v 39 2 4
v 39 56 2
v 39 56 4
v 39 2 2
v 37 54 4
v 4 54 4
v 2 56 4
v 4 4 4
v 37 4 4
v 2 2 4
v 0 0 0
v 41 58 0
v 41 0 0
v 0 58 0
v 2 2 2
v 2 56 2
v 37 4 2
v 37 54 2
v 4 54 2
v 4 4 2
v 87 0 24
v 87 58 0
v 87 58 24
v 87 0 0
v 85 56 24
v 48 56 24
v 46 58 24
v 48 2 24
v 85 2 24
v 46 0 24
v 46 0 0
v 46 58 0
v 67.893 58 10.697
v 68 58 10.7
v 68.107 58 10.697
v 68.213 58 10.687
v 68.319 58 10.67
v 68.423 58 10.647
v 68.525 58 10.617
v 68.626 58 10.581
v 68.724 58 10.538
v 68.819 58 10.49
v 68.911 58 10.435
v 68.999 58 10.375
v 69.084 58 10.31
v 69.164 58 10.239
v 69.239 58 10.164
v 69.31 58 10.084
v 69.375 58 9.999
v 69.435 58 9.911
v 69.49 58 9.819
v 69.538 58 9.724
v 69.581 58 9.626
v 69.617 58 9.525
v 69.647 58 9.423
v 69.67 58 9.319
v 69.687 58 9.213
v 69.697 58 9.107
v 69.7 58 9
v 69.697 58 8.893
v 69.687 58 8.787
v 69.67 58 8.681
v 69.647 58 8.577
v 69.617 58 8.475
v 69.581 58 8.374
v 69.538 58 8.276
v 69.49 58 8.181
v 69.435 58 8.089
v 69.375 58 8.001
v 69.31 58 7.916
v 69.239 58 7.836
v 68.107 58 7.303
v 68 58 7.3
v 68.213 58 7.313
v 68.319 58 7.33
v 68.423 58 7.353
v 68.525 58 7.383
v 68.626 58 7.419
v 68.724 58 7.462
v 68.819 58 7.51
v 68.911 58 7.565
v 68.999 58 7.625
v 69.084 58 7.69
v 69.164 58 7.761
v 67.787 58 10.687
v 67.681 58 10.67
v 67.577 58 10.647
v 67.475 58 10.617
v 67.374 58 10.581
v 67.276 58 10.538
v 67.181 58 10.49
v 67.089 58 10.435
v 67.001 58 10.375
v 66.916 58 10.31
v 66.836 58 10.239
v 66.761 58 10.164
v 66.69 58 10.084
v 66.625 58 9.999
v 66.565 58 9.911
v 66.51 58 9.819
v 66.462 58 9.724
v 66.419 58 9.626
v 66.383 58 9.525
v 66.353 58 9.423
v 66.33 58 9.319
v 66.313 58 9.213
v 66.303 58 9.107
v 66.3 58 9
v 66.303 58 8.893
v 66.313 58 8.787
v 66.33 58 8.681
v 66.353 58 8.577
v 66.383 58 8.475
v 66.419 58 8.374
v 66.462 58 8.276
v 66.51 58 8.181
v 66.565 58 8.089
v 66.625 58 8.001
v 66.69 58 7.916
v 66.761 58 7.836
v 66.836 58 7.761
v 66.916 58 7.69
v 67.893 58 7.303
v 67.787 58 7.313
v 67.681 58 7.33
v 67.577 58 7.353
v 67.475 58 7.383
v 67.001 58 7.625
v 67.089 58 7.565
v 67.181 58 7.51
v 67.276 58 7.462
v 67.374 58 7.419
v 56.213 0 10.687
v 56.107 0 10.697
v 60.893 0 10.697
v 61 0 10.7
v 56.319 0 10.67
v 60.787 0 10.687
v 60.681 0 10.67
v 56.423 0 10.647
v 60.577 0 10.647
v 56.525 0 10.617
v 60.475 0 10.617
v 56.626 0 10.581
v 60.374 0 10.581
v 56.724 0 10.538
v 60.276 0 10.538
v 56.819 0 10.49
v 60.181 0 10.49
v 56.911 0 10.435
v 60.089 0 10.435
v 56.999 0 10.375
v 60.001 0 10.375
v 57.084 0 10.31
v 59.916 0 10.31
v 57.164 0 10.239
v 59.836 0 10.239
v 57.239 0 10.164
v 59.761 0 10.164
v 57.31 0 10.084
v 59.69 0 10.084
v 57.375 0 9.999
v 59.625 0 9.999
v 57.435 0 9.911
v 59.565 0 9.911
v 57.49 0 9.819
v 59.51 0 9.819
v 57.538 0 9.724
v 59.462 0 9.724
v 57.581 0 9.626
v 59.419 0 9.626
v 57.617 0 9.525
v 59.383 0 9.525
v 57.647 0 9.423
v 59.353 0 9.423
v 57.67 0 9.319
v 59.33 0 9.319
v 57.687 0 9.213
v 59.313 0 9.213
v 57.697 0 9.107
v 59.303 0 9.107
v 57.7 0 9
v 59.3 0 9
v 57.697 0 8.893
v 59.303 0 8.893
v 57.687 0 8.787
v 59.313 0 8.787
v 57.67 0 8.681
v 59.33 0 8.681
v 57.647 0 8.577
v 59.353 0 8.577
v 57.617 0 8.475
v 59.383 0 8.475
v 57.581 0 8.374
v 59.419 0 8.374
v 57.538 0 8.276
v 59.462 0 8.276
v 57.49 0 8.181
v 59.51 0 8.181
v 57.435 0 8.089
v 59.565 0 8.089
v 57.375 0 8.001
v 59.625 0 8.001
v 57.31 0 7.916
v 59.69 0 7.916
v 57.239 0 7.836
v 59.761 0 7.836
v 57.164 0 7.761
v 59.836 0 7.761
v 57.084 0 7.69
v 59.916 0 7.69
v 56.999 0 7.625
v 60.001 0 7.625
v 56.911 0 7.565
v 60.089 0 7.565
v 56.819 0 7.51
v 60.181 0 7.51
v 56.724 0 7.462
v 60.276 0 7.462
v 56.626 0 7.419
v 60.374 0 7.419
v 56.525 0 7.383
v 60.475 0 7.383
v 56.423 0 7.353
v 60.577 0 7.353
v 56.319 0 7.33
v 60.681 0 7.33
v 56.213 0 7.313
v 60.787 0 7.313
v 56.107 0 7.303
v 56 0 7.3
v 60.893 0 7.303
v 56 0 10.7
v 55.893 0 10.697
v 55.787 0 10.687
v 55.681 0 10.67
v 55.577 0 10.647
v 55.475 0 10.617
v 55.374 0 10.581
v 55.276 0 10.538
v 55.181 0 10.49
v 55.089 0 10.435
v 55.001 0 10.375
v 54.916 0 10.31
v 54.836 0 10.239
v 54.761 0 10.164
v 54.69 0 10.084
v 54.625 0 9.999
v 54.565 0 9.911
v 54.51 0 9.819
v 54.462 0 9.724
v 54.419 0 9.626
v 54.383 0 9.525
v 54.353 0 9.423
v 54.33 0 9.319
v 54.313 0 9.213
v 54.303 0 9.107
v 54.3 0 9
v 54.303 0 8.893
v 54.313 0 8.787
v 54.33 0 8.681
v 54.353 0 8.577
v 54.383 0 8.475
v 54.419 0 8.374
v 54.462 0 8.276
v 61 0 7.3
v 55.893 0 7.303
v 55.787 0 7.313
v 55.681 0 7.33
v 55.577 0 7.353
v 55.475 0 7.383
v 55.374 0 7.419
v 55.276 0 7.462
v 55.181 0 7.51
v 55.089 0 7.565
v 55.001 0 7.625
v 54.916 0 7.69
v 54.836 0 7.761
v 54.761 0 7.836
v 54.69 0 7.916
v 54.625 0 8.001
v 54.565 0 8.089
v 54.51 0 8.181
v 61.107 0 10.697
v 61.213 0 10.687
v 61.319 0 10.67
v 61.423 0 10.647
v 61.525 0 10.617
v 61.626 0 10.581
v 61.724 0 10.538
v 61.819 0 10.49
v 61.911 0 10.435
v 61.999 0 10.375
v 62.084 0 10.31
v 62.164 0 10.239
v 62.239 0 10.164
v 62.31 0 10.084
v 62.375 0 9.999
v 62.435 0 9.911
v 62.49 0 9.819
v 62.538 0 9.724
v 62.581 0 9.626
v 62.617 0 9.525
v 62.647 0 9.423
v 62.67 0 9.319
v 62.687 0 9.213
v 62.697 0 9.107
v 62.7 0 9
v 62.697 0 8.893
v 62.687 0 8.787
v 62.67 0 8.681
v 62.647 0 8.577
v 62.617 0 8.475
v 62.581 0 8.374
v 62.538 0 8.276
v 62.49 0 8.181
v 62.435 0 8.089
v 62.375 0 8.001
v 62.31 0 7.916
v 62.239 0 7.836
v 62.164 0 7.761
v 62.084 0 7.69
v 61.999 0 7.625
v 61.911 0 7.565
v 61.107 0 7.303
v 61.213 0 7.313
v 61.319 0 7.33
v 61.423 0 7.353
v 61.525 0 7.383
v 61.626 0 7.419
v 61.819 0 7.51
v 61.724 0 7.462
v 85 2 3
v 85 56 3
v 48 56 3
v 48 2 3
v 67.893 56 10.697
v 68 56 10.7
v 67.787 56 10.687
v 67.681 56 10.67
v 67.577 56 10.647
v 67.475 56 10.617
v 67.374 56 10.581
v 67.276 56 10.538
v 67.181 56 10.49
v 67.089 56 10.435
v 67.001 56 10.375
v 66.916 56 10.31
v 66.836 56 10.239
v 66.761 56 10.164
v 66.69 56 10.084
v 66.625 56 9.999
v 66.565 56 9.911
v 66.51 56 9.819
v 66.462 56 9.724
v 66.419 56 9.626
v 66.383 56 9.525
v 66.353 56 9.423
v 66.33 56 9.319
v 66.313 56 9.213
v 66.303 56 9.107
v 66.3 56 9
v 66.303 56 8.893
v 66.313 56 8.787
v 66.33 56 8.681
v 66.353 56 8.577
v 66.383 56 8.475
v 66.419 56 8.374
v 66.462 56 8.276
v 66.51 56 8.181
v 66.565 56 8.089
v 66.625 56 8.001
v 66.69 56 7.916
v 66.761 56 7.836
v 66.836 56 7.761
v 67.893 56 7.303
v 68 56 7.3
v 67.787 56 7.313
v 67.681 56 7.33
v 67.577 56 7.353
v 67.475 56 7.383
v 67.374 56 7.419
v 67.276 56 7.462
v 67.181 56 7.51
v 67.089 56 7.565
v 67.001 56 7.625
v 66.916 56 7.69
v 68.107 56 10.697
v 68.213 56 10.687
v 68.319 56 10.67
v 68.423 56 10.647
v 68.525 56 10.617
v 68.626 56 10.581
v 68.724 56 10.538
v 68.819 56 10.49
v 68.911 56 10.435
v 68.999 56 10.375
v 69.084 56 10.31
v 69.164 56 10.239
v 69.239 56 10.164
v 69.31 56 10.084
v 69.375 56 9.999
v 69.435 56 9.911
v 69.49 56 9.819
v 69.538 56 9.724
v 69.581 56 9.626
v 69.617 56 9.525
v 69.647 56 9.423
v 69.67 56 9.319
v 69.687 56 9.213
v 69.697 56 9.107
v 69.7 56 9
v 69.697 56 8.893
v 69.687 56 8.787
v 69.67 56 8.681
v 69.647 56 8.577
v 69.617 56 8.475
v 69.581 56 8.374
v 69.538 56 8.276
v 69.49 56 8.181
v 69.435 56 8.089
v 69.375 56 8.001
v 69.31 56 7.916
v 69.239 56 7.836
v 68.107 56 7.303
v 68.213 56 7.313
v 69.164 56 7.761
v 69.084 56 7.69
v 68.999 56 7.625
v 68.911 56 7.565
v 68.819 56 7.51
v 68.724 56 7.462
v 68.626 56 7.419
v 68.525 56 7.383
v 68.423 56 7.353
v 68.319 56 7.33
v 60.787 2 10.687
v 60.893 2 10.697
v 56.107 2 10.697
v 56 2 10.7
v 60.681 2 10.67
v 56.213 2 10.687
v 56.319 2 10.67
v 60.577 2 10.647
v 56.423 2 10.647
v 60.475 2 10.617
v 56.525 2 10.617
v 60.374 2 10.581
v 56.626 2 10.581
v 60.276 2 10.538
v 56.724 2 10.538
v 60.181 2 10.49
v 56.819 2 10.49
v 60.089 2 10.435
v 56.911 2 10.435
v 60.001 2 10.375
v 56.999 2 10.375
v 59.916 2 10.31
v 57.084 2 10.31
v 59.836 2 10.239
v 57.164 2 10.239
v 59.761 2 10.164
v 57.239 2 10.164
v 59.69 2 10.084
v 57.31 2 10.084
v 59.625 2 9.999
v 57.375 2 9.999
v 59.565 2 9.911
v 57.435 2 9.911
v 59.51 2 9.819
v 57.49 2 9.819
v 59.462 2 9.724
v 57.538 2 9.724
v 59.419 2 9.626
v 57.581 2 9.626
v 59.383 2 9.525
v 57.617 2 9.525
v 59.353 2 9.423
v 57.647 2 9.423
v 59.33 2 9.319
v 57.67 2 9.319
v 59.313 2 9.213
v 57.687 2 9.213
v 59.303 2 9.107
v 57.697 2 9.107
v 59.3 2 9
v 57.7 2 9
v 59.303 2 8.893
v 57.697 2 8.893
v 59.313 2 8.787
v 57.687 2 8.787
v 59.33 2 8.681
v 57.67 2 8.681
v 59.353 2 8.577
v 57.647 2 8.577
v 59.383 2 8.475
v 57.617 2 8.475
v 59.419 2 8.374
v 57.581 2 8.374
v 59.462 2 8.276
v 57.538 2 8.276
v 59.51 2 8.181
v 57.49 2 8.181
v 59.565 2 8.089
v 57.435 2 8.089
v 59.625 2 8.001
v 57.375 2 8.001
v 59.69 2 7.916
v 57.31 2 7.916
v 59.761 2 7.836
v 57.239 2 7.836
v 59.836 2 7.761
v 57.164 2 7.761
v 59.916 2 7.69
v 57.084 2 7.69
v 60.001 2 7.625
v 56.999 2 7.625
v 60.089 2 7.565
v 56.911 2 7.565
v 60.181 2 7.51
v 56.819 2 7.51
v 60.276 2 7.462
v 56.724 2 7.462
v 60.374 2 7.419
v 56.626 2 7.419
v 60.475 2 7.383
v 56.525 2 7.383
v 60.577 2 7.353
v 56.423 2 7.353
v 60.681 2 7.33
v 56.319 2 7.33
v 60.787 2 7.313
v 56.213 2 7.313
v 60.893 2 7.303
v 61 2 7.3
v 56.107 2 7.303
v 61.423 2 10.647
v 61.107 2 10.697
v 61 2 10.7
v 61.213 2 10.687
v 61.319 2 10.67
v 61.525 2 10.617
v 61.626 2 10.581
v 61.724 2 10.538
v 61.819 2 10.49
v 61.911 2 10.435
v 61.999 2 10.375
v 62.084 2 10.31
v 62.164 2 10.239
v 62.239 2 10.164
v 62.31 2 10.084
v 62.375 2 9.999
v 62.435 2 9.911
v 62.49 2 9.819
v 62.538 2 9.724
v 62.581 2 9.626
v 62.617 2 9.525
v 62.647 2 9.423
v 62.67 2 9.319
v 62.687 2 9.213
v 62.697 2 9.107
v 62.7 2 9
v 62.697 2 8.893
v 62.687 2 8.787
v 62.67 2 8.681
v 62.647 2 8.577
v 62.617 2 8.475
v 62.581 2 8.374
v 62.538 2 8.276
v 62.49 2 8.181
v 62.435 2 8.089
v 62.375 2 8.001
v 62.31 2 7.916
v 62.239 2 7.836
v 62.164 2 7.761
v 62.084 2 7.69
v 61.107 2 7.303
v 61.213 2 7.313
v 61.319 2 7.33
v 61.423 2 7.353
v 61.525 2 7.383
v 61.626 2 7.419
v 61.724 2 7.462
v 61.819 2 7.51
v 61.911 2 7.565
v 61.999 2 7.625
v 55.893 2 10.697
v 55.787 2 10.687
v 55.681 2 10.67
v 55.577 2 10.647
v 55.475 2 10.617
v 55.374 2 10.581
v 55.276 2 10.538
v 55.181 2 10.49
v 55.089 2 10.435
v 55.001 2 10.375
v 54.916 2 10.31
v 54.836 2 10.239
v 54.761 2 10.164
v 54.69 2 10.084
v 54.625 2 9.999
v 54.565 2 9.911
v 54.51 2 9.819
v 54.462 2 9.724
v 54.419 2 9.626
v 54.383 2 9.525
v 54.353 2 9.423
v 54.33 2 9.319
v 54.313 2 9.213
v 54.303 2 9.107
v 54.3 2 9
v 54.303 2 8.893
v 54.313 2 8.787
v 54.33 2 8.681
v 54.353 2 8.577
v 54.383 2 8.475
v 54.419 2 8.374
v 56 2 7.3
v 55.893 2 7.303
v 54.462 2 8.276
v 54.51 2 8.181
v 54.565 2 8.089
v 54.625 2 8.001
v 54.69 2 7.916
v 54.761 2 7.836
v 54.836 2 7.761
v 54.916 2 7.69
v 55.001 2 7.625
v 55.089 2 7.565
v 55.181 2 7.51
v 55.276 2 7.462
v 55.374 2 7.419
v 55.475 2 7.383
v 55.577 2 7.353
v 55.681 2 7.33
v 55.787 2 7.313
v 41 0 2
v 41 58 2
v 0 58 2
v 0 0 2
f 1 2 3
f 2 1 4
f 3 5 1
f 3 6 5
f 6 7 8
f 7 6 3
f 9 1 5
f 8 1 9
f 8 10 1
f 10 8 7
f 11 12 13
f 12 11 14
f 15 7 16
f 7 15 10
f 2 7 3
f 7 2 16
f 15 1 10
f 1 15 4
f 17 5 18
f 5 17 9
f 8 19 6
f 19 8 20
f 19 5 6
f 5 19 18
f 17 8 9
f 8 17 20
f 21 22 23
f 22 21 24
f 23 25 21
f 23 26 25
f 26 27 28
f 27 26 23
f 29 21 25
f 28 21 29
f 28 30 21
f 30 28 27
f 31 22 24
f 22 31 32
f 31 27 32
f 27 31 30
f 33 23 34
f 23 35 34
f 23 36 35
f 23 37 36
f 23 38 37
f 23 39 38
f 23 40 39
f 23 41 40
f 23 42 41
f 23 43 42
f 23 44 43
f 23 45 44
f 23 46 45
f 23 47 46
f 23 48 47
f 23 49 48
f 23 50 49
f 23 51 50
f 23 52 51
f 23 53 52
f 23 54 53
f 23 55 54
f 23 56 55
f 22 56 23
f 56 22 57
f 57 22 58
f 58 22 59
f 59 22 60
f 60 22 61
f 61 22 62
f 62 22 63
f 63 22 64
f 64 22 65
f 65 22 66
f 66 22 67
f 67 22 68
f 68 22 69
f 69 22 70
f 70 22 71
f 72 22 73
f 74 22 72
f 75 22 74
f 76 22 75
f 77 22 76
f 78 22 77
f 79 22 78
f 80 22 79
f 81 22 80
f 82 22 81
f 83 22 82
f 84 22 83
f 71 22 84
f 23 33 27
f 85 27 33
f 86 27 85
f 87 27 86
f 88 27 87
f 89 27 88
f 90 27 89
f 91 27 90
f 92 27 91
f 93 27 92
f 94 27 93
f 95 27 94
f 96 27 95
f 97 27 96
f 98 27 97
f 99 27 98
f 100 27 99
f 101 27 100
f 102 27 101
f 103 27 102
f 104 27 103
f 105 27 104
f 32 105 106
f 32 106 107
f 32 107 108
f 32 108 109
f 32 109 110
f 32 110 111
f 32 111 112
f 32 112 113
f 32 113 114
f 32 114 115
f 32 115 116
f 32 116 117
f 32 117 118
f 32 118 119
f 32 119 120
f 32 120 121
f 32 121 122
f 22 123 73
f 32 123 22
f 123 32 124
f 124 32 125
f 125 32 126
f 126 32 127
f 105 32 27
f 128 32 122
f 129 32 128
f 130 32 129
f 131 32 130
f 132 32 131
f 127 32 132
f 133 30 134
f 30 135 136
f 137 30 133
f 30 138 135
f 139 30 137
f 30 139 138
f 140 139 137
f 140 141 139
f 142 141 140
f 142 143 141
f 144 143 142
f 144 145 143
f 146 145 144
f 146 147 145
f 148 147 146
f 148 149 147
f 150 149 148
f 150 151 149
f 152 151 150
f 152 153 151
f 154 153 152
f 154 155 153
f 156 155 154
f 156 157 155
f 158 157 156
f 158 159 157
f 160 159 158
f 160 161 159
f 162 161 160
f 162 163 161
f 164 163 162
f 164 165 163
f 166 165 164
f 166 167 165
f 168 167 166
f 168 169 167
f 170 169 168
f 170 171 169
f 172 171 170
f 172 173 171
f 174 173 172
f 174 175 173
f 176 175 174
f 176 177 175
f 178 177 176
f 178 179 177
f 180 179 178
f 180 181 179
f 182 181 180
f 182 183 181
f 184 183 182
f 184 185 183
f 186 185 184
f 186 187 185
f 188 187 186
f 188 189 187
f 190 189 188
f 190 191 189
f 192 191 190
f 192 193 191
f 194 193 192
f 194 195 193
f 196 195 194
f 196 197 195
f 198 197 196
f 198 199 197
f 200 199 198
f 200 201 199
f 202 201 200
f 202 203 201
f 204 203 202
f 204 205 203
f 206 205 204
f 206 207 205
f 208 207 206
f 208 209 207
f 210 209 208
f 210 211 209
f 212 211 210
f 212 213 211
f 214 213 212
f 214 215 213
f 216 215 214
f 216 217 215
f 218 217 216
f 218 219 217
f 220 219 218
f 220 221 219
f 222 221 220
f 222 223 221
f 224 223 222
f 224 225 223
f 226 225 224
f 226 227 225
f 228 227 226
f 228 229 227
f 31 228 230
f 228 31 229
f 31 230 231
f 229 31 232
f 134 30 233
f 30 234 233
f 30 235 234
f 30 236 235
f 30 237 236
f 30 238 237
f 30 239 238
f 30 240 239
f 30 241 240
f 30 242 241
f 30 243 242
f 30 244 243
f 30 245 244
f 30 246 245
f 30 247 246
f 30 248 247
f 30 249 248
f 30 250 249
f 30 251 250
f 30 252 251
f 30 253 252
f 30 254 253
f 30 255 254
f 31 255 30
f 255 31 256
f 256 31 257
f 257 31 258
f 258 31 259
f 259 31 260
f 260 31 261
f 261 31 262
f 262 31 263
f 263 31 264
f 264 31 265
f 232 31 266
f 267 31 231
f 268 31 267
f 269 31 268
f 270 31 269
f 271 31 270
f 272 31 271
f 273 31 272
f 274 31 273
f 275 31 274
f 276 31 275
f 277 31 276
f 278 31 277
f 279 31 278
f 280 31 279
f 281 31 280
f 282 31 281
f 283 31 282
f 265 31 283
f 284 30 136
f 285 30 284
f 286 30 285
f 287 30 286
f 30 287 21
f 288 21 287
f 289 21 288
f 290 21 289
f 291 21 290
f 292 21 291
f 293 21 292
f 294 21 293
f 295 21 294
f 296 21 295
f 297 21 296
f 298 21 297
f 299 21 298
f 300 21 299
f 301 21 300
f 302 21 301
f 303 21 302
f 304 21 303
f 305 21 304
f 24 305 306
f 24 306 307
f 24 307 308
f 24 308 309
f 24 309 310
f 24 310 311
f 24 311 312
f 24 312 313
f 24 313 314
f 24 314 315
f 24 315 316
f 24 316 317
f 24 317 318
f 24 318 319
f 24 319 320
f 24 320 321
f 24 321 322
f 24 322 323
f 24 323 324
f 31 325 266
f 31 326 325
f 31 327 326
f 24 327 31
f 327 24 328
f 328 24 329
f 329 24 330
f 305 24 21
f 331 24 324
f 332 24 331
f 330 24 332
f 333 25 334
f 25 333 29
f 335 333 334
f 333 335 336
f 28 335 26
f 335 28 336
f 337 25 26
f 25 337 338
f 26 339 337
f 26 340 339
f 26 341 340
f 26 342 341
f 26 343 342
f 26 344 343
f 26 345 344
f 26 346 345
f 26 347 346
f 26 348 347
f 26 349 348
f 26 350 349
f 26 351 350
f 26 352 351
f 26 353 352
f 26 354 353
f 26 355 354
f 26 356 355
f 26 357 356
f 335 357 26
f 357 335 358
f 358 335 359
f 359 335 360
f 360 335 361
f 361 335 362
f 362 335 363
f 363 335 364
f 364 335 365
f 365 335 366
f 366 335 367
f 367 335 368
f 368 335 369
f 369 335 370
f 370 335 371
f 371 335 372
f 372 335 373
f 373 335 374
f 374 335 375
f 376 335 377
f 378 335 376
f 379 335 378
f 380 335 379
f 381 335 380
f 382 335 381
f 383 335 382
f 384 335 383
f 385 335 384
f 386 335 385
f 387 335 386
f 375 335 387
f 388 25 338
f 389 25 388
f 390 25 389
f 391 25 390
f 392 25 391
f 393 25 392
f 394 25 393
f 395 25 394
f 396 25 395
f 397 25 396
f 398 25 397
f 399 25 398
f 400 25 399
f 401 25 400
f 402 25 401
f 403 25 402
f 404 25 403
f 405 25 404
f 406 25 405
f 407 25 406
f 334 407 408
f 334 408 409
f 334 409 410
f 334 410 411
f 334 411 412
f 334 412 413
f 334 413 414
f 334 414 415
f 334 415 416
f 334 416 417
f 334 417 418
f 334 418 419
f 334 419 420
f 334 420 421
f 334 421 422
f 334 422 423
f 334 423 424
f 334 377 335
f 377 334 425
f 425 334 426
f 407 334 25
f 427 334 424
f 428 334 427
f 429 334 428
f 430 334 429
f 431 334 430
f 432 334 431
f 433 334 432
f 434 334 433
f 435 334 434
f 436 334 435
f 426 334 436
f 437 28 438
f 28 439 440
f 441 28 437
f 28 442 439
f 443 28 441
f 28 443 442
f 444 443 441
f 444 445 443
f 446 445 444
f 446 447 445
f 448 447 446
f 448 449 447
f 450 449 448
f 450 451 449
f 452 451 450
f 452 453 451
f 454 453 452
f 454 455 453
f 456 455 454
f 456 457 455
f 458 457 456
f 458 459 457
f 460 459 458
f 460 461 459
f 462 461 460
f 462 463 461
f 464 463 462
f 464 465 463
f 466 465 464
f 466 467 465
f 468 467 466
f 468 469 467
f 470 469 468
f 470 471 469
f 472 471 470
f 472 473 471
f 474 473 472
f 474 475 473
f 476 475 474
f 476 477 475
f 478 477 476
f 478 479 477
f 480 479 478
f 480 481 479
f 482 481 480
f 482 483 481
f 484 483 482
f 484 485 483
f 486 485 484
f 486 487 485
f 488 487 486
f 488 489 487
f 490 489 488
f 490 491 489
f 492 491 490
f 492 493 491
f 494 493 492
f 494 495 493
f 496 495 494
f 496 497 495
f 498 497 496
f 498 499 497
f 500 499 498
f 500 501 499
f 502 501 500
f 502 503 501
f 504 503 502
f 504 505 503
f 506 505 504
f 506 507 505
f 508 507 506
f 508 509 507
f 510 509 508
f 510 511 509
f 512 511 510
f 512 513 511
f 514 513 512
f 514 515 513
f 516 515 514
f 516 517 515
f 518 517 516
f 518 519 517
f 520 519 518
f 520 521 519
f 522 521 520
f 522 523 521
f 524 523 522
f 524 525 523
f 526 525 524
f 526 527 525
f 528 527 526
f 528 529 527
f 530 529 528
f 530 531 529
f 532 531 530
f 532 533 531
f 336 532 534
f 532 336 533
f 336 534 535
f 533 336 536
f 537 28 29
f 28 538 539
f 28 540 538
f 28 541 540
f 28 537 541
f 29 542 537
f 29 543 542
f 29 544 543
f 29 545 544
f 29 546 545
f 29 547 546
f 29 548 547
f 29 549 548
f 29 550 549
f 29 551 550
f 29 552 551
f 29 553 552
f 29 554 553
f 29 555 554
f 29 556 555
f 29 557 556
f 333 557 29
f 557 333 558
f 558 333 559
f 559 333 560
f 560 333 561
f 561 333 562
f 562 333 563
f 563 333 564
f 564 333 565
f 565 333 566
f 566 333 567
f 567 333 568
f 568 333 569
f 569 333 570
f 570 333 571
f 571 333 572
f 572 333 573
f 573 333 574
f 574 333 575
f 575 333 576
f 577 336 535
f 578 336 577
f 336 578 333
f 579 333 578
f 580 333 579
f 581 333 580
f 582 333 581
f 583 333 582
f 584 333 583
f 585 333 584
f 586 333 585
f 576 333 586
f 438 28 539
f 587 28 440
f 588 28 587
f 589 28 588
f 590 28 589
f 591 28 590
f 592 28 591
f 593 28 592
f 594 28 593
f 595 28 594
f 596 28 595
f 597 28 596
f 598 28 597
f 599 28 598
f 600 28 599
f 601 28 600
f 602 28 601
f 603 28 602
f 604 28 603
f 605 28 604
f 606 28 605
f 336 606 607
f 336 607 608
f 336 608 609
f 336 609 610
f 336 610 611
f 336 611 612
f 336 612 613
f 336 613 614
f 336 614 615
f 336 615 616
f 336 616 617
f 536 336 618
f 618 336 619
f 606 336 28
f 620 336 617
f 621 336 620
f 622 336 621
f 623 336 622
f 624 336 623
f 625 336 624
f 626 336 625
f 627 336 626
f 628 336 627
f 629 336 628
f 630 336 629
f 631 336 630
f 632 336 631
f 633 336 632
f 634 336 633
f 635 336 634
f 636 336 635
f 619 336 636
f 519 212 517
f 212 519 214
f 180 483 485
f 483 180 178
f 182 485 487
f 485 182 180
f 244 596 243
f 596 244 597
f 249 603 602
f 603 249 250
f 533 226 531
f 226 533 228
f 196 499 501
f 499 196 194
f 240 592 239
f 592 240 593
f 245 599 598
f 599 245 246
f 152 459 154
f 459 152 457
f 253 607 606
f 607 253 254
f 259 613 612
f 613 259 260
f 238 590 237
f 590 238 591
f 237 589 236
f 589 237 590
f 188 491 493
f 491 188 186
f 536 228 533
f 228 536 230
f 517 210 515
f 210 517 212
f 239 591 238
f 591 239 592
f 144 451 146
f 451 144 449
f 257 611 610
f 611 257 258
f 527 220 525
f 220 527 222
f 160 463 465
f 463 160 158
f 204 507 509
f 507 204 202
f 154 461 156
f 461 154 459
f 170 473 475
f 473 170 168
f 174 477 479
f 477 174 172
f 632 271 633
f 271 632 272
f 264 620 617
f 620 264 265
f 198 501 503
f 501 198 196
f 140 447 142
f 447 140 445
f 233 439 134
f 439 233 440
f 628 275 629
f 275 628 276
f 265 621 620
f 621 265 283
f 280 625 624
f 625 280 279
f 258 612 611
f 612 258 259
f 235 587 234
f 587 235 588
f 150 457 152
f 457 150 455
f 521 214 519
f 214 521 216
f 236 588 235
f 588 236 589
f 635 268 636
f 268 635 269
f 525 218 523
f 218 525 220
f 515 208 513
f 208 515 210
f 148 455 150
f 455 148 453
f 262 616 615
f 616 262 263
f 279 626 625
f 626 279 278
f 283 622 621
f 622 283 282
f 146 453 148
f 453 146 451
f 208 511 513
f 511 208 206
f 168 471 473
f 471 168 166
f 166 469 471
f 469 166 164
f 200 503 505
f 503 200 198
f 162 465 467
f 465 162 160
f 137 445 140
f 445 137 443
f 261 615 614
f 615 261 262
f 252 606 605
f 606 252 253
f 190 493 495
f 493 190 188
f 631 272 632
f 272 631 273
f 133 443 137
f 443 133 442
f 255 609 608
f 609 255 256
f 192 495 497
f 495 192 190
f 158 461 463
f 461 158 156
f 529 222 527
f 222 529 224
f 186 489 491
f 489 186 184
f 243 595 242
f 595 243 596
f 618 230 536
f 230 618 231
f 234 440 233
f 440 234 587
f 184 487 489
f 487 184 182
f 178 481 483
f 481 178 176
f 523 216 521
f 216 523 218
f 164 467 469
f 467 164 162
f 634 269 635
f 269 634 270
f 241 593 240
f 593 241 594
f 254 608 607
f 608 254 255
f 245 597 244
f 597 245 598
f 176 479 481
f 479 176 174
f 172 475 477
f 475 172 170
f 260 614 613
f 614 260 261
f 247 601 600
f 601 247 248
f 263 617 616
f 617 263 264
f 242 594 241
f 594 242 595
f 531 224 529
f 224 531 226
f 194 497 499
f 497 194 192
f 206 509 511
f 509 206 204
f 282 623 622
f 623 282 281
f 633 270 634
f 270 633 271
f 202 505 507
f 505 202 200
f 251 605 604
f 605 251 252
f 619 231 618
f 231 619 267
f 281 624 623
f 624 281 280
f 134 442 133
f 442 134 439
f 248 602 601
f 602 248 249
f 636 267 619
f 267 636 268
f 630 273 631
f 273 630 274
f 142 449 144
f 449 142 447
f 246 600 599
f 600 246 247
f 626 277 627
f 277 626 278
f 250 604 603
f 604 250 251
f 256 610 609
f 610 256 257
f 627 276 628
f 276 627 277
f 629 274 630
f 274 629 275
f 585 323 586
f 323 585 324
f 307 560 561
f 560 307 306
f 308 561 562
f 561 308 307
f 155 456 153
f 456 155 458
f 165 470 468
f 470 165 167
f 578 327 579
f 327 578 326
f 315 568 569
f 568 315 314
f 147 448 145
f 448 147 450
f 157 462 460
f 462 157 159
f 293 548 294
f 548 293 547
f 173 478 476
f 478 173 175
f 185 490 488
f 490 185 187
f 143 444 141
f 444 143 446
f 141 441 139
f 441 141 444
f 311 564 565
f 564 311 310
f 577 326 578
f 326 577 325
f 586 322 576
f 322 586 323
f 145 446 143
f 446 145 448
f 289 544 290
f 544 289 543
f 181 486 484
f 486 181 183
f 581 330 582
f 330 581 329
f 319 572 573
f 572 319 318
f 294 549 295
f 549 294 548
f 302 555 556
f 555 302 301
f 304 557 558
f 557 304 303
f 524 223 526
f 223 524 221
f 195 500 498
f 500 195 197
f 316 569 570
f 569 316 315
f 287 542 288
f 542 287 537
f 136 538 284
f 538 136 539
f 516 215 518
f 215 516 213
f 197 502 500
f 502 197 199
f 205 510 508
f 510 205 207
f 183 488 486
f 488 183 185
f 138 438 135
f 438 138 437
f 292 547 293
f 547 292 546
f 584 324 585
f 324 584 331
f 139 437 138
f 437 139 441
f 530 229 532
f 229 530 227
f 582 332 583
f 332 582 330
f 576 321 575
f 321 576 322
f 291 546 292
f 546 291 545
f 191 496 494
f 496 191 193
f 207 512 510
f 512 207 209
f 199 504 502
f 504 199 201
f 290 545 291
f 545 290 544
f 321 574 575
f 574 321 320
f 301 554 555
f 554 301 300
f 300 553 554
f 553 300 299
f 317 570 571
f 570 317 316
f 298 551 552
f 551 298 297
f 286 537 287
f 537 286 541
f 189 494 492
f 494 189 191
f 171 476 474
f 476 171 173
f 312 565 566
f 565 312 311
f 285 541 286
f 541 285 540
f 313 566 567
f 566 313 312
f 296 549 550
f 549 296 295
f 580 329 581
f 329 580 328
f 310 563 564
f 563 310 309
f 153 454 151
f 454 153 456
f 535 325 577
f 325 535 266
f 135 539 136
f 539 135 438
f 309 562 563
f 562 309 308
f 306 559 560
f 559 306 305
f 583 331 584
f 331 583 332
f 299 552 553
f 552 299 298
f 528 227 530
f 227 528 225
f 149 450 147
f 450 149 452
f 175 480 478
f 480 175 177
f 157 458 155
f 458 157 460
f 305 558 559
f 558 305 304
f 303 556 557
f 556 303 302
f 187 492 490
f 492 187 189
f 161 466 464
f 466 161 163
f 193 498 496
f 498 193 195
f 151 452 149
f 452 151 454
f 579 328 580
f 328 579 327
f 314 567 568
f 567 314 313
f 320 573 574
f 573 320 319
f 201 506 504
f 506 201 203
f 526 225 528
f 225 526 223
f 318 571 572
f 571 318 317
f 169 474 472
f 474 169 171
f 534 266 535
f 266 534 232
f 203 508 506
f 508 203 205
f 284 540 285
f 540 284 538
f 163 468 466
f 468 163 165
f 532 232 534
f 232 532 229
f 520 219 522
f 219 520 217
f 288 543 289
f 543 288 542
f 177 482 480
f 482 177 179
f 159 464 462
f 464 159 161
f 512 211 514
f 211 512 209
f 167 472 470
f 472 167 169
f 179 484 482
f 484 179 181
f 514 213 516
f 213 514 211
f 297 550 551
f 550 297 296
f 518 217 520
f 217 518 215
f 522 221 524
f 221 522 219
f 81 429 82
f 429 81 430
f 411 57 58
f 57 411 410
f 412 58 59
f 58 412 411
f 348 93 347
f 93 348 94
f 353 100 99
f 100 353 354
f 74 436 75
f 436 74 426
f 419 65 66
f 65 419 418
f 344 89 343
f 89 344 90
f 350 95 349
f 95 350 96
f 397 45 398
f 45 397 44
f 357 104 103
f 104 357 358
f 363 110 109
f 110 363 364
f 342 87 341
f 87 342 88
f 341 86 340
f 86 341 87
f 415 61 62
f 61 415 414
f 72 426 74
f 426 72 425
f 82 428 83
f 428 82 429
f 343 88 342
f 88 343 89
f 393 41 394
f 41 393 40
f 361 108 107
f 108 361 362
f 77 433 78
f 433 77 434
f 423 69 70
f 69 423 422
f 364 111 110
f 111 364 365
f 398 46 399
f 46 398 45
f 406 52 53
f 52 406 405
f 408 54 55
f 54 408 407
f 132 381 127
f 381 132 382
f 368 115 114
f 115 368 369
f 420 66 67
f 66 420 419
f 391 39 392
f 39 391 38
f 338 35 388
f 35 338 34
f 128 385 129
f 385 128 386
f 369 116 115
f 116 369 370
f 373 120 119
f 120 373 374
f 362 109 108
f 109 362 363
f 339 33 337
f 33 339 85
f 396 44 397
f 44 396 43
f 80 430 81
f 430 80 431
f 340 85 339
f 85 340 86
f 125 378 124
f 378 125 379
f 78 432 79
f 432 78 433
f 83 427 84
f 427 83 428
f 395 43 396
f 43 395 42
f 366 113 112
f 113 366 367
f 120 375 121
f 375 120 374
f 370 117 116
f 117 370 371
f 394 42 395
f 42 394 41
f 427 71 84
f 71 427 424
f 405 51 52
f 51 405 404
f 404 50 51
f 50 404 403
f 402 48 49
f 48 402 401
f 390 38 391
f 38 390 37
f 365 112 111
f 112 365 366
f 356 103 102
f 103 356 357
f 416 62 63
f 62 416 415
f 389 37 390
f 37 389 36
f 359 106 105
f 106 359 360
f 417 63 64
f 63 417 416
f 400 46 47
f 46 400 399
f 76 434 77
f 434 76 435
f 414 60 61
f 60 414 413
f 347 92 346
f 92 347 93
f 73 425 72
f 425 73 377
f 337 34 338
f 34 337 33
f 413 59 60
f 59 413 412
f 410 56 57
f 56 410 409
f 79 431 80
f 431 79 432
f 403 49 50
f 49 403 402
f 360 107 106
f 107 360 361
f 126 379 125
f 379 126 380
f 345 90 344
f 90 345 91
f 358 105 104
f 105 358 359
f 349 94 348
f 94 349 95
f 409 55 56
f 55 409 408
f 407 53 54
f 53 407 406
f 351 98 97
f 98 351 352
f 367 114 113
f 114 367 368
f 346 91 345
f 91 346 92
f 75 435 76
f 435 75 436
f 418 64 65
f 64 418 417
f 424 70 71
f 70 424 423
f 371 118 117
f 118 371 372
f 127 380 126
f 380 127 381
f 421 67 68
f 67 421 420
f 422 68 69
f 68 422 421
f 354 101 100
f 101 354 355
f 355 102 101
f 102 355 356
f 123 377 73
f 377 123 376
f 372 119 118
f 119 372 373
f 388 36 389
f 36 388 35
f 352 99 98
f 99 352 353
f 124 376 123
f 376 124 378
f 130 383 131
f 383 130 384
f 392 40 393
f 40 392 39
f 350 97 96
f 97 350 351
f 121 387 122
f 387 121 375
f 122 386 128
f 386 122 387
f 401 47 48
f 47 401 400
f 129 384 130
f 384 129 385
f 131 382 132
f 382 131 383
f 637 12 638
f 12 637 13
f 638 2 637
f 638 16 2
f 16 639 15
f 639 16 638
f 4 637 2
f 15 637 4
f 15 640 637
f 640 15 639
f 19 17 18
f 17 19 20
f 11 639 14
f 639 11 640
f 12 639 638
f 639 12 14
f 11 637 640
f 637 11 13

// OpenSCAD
inside_x=37;
inside_y=54;
inside_z=20;
borders_z=4;
borders_width=2;
//deck
box_x=inside_x+borders_width*2;
box_y=inside_y+borders_width*2;
deck_z=2;
//only for box
hole_radius=1.7;
hole_z=9;
box_z=inside_z+borders_width+deck_z;


module deck1() {

cube([box_x,box_y,deck_z]);

}


module squareBorders(x_length,y_length,z_length,width){
difference(){
    //outer
cube([x_length,y_length,z_length]);
    //inside cutter
translate([width,width,-1]) cube([x_length-2*width,y_length-2*width,z_length+3]);
}
}

deck1();
    
translate([borders_width,borders_width,0]) squareBorders(box_x-2*borders_width,box_y-2*borders_width,borders_z,borders_width);


//box


module box1() {
difference(){
cube([box_x,box_y,box_z]);
translate([2,2,+3]) cube([box_x-borders_width*2,box_y-borders_width*2,box_z+9]);}
}

module cylinderCut(){
rotate([90,0,0]) cylinder(h=5,r=hole_radius, $fn=100); //cylinder for cutting holes for wires
}

translate([box_x+5,0,0]){    
difference(){
box1();
translate([10,3,hole_z]) cylinderCut();
translate([15,3,hole_z]) cylinderCut();
translate([22,box_y+1,hole_z]) cylinderCut();
}}
